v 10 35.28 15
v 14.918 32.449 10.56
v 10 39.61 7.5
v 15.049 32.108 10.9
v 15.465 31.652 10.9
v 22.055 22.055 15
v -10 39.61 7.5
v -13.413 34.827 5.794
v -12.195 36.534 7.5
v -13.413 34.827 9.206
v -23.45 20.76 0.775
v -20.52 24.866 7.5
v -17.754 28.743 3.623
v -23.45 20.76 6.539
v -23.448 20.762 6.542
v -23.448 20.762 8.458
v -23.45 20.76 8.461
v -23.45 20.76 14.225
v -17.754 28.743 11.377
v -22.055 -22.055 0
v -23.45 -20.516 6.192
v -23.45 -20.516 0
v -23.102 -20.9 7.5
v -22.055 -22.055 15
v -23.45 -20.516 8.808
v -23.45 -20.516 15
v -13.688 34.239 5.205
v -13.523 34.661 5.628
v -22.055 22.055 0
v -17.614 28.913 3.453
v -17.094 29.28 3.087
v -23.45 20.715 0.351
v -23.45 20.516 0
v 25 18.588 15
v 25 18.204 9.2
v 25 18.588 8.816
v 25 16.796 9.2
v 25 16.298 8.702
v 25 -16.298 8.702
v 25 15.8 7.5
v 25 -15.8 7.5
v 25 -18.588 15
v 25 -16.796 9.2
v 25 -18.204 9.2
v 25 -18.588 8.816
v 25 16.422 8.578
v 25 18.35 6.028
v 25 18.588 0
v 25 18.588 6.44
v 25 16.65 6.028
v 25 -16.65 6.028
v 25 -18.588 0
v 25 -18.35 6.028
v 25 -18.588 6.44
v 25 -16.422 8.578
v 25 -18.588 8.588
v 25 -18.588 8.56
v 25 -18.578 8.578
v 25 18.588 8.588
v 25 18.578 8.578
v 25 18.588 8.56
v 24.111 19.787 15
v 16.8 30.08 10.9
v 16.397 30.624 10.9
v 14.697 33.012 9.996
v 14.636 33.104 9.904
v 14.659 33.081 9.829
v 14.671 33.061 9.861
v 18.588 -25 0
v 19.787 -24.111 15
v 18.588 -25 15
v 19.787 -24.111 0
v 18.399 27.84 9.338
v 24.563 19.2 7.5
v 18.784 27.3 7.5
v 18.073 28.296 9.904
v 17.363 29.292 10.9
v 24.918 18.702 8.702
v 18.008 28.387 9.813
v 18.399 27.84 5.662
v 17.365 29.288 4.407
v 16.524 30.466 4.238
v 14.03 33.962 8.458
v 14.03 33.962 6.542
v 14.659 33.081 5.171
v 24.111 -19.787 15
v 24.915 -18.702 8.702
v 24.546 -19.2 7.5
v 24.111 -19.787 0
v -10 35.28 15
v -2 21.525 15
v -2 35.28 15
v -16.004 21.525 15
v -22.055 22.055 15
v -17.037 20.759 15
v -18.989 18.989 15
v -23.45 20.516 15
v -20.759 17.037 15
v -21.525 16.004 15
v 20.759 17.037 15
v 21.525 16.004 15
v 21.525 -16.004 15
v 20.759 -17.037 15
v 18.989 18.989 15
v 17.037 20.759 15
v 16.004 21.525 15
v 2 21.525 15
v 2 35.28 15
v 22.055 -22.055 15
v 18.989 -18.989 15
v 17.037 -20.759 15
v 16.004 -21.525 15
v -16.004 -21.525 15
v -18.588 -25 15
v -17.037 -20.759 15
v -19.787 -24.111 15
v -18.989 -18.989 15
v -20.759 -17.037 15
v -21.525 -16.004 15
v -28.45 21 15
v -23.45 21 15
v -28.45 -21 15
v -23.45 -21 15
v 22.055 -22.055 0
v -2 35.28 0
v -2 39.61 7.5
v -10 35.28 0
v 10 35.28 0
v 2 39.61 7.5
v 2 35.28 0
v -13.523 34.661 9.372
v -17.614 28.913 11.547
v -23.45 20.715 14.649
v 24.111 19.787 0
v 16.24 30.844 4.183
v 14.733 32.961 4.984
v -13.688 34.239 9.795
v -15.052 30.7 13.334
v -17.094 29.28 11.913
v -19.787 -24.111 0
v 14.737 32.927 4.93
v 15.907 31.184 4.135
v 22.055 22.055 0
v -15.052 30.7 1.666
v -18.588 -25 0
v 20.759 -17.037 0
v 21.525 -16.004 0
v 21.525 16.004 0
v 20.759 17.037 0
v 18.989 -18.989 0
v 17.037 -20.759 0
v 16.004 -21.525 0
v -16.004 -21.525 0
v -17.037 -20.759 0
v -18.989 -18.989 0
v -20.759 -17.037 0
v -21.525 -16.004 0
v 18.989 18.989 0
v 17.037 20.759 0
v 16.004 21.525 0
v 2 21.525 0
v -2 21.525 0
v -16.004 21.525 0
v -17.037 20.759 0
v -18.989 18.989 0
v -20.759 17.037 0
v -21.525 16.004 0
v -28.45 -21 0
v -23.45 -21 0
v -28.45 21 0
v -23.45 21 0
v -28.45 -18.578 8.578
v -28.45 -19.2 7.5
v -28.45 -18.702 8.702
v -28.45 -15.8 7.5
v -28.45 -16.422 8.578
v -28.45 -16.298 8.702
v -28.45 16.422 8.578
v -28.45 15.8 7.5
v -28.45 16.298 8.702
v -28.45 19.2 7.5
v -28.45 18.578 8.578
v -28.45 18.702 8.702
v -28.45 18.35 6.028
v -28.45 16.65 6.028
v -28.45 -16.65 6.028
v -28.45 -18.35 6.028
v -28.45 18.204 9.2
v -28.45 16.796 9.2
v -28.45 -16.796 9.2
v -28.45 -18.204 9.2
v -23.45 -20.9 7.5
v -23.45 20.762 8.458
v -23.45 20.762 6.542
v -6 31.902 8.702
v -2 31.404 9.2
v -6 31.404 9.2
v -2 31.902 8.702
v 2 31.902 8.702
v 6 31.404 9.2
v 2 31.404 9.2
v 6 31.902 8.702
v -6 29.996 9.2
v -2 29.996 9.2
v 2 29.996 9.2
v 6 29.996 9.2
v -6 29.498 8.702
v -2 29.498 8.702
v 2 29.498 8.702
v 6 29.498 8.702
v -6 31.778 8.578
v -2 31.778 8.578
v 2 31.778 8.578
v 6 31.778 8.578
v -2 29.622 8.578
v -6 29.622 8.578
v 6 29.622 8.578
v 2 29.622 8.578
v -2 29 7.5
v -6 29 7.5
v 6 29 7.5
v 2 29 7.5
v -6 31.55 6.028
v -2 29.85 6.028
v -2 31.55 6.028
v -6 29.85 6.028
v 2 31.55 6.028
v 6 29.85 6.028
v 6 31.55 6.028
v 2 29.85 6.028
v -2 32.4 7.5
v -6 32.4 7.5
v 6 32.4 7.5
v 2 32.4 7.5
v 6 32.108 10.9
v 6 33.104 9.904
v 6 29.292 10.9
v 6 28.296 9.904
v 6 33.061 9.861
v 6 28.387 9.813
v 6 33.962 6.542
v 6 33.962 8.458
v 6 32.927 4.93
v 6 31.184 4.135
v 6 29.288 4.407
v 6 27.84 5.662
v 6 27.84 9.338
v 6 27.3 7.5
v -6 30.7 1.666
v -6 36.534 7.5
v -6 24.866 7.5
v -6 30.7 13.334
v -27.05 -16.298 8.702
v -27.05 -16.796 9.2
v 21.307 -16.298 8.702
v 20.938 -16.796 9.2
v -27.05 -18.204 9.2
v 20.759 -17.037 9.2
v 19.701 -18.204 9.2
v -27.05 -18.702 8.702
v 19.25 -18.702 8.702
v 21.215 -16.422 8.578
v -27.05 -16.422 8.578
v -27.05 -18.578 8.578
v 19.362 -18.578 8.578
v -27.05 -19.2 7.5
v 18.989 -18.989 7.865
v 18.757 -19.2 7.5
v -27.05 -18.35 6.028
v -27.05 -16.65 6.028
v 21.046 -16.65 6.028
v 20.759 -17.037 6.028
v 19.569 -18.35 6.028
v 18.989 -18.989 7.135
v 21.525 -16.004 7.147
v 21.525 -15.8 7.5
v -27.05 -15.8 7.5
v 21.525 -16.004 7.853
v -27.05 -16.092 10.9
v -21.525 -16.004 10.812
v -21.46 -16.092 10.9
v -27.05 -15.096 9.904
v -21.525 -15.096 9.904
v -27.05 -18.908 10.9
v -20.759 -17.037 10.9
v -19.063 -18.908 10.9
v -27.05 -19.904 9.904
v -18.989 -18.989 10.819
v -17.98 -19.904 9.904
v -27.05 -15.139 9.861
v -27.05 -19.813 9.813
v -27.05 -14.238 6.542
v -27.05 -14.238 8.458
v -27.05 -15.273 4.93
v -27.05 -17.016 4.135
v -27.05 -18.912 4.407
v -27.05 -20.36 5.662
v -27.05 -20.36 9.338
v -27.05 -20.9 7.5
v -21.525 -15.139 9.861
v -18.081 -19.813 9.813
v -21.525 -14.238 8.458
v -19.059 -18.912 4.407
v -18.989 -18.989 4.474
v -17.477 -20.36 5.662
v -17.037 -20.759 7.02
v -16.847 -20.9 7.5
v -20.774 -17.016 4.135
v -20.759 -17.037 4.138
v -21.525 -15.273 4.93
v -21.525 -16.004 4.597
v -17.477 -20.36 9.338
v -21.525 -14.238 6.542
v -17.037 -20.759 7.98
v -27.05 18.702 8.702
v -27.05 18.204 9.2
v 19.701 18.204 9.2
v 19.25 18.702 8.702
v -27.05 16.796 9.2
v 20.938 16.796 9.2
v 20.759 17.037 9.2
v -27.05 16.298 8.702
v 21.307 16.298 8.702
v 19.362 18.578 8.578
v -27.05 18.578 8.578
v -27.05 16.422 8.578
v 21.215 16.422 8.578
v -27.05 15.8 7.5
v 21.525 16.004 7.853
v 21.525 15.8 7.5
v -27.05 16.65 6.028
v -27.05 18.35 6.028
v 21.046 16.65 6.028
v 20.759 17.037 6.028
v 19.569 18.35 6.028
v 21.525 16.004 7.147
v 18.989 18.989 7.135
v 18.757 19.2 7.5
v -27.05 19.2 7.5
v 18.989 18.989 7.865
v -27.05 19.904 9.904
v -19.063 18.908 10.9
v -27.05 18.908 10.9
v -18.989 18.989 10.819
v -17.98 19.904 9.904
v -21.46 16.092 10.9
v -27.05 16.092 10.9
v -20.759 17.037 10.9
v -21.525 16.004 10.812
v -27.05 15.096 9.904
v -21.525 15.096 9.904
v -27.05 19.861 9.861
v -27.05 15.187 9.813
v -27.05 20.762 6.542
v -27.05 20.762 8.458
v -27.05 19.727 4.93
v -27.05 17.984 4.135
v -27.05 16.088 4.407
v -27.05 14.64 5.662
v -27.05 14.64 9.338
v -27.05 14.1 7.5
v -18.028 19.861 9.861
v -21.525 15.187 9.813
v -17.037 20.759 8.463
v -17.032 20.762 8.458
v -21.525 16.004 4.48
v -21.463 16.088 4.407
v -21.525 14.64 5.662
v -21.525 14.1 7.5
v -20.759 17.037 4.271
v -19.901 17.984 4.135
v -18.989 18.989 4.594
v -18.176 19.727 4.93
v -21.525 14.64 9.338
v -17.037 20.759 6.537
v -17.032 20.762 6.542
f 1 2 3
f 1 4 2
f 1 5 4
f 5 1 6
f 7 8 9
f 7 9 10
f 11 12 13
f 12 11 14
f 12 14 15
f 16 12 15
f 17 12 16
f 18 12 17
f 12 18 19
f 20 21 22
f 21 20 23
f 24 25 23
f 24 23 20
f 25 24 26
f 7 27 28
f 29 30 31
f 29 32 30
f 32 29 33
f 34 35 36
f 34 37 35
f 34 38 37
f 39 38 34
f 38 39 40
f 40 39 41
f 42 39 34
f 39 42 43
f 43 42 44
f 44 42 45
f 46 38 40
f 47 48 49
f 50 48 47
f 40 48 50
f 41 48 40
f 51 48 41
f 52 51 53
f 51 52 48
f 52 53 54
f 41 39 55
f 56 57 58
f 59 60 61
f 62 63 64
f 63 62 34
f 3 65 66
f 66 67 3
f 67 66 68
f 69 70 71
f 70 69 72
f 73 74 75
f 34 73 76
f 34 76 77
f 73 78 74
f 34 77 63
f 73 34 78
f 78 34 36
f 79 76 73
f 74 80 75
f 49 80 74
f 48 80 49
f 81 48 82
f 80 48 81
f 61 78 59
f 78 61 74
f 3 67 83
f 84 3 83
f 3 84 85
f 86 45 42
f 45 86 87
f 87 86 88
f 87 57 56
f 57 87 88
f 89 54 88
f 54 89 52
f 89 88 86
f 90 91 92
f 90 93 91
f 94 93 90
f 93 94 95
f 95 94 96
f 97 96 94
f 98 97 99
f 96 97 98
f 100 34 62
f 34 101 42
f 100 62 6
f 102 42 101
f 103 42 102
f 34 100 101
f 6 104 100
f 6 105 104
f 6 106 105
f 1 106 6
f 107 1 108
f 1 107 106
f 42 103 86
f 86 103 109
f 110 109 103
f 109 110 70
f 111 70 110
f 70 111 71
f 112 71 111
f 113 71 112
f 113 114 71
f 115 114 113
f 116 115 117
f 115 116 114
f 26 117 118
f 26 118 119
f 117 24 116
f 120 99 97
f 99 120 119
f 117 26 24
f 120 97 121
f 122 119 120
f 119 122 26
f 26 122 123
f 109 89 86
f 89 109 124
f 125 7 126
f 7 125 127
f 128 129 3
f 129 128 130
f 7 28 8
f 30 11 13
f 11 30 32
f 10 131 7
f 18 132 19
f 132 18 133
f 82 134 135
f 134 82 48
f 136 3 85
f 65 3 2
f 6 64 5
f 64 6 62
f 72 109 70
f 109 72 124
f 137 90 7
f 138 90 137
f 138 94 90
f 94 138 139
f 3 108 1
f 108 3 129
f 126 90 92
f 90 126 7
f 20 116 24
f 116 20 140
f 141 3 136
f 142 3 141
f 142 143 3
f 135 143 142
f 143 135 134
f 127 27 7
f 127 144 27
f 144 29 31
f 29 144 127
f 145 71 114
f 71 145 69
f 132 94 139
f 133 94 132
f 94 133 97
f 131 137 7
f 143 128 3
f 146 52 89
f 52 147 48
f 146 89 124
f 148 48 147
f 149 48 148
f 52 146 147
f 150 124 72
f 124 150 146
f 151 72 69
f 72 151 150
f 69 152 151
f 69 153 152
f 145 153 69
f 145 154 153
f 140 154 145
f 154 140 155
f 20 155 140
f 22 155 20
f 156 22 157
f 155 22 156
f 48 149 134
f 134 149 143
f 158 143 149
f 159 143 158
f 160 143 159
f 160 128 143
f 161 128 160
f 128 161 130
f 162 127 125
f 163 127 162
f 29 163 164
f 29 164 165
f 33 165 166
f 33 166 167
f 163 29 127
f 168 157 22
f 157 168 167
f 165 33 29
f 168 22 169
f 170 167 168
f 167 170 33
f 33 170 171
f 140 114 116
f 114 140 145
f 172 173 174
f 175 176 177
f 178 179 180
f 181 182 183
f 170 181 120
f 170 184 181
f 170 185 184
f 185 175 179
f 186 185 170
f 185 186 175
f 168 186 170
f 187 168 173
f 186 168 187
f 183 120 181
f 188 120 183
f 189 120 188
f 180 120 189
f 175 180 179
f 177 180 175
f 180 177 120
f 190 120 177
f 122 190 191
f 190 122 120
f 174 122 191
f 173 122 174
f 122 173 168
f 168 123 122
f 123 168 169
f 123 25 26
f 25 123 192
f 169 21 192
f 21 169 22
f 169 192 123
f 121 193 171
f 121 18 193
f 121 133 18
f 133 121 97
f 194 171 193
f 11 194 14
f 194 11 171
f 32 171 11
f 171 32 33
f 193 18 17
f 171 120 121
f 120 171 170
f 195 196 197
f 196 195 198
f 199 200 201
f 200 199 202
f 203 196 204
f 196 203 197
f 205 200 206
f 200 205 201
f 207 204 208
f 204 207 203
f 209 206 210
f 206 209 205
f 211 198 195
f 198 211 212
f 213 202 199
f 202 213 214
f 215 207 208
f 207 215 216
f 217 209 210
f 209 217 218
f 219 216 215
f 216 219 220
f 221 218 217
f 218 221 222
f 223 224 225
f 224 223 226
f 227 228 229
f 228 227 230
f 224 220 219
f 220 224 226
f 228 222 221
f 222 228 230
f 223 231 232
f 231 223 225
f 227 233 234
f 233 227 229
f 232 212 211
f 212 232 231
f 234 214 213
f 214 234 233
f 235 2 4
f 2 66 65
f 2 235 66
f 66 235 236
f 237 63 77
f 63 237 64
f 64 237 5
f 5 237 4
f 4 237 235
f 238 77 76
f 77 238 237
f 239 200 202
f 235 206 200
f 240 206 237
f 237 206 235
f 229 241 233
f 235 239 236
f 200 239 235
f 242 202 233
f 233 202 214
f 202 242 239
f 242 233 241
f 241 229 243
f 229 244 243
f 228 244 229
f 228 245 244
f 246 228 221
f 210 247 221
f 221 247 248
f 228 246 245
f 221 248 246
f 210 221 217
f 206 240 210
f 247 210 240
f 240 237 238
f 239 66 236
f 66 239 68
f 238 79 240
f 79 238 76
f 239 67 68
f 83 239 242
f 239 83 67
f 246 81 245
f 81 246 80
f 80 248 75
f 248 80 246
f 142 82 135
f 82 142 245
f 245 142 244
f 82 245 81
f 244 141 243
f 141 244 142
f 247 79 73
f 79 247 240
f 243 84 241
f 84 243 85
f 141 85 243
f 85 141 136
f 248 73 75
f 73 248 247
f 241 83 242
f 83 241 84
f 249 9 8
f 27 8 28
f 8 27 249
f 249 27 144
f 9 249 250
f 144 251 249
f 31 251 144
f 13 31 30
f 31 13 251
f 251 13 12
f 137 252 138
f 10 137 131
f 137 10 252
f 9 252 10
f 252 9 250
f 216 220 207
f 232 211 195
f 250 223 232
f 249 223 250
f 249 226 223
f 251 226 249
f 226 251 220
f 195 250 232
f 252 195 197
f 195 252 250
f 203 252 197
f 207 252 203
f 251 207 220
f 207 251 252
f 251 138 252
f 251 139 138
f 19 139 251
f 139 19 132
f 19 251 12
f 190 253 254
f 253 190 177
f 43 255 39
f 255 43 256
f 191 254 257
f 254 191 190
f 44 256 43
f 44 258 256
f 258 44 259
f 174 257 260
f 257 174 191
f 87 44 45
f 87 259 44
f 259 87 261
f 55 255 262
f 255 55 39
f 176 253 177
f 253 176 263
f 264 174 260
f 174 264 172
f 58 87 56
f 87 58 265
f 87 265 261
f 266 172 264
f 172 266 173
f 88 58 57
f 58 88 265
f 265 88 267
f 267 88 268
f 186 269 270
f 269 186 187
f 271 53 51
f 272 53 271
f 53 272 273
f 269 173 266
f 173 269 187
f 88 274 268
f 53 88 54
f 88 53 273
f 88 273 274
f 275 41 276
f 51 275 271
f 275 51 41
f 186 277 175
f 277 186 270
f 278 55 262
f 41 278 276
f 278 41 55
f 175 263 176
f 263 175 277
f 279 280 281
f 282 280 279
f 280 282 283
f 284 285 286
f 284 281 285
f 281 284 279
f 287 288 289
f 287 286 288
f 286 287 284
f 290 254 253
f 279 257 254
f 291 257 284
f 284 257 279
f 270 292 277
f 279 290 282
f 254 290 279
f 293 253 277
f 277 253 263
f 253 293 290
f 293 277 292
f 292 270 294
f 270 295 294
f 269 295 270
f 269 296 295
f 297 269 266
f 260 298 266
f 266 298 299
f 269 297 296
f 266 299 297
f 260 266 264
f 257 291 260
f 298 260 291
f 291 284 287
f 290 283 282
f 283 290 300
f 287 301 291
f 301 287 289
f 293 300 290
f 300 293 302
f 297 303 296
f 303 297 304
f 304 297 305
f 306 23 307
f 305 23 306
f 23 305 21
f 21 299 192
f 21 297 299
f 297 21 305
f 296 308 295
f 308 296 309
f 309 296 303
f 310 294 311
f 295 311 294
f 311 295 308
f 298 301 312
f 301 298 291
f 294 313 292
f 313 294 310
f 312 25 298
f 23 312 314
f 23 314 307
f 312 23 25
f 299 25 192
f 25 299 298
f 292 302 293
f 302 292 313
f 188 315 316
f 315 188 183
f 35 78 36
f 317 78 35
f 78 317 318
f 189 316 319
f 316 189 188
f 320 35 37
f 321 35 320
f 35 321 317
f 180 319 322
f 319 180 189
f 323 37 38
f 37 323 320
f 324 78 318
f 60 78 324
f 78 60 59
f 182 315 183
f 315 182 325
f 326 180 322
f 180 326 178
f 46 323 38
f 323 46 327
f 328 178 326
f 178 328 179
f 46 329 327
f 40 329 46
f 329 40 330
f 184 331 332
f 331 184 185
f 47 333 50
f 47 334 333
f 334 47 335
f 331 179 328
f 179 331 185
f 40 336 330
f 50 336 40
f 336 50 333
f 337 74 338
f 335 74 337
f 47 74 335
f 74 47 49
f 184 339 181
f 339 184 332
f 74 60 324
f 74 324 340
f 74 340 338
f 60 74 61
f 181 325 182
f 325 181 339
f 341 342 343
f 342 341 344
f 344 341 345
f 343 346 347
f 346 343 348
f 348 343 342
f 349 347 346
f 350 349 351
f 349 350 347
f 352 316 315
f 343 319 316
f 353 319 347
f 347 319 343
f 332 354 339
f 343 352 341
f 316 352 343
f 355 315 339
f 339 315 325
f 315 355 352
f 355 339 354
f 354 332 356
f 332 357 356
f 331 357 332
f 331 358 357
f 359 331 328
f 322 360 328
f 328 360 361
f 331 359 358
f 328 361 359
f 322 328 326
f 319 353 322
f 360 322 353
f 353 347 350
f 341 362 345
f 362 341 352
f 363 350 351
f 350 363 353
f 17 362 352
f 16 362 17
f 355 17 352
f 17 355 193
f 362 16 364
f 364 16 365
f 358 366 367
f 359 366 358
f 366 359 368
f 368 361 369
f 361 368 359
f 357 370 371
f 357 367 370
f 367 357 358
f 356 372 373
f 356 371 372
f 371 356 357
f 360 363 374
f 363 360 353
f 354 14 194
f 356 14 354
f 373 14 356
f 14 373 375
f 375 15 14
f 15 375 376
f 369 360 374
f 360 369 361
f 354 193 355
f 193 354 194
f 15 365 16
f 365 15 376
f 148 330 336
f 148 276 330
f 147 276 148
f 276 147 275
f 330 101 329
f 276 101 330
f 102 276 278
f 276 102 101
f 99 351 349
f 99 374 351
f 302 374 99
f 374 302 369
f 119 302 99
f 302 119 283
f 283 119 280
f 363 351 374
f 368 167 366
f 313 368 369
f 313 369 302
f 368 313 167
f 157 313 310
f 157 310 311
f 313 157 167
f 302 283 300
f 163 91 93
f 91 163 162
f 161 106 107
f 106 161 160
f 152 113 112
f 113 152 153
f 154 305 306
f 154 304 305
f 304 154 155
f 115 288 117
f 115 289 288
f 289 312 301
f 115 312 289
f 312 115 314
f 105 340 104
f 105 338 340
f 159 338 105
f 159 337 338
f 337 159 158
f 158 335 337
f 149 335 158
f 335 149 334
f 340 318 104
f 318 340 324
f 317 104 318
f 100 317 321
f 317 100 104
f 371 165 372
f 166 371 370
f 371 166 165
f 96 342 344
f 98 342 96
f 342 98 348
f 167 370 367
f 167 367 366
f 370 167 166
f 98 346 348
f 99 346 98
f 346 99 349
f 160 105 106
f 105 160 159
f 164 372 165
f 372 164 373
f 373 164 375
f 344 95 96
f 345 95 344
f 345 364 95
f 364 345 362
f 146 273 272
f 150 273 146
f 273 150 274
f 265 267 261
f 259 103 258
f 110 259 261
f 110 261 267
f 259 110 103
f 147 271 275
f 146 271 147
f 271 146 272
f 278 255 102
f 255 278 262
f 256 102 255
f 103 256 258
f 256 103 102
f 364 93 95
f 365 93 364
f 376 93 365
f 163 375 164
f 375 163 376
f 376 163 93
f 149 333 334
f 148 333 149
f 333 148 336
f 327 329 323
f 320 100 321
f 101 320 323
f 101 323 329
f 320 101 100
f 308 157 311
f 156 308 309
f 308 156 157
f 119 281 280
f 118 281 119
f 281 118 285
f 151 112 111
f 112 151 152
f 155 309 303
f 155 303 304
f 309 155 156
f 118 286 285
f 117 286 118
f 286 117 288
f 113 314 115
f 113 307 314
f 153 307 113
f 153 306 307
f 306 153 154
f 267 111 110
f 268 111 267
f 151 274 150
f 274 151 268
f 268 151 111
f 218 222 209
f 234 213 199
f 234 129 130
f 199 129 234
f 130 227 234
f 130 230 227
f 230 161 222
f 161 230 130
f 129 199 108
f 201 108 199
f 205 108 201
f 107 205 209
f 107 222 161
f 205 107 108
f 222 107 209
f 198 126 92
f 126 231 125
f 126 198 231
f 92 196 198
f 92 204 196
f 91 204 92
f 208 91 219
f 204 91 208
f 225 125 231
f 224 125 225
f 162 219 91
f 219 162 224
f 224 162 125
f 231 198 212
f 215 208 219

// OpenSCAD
slop=.2;

//english sizes - 6-32 - for graber i3 clamp
632_dia = 3.5;
632_rad = 632_dia/2+slop;
bolt_rad = 632_rad;
632_nut_rad = 8.25/cos(45)/2;
nut_rad = 632_nut_rad;
632_cap_dia = 6.5;
632_cap_rad = 632_cap_dia/2+slop;
632_cap_height = 2+slop;
632_nut_height = 5;


m3_nut_rad = 6.01/2+slop;
m3_nut_height = 2.4;
m3_rad = 3/2+slop;
m3_cap_rad = 3.25;


wall=4;
motor_w = 42;
motor_r = 52/2;

mount_sep = 35;  //needs to match ext_offset from x-carriage.scad


extruder_mount(mount_screw_rad=m3_rad);

//attaches the motor with one or two screws.
module extruder_mount(screws = 1, flip=0, fan_mount=0, mount_screw_rad = 632_rad, angle=0, height=15, offset=0, motor_offset=1){
	echo(height);
	wall=4;
	lower_hole_sep = 47.5;
	lower_hole_rad = 6+slop;
	lower_hole_height = -7.5;
	lower_hole_depth = 6;

	hole_sep=30;
	fan_hole_sep = 32;
	fan_offset= 5;
	
	scale_slop = 1.025;
	scale_size = (motor_w+wall+wall)/motor_w;
	difference(){
		union(){
			hull(){
				//strap
				scale([scale_size,scale_size,1]) motor_base(h=height);

				//clamp
				translate([0,motor_w/2+wall+632_rad+wall,height/2]) rotate([0,90,0]) clamp(height=height, 1);			
			}

			//mount base
			hull(){
				//translate([-motor_w/2+.05,0,height/2]) cube([.1,motor_w,height], center=true);
				translate([-motor_w/2-wall-wall/2+.05+1+offset,0,height/2]) rotate([0,0,angle]) cube([wall+1,motor_w,height], center=true);

				if(screws == 2){
					translate([-motor_w/2-wall-wall,0,height/2+hole_sep]) rotate([0,0,angle]) rotate([0,90,0]) cylinder(r=632_cap_rad+wall-.75, h=wall+1);
				}
			}

			//strengthen the vertical mount
			if(screws == 2){
				difference(){
					hull(){
						translate([-motor_w/2-wall/2+.05+1,0,height/2]) cube([wall+2,motor_w,height], center=true);

						translate([-motor_w/2-wall,0,height/2+hole_sep]) rotate([0,90,0]) cylinder(r=632_cap_rad+wall-.75, h=wall+2);
					}

					hull(){
						translate([-motor_w/2-wall+1+wall,0,height+wall]) rotate([90,0,0]) scale([1,1,1]) cylinder(r=wall, h=motor_w+wall*2, center=true, $fn=90);
                                                translate([-motor_w/2-wall+10+wall,0,height+wall]) rotate([90,0,0]) scale([1,1,1]) cylinder(r=wall, h=motor_w+wall*2, center=true, $fn=90);
						translate([-motor_w/2-wall+1+wall,0,height+wall*2+hole_sep]) rotate([90,0,0]) cylinder(r=wall, h=motor_w+wall, center=true);
					}
				}
			}

			//add a fan mount
			if(fan_mount==1){
				for(i=[-1,1]) translate([fan_hole_sep/2*i, -motor_w/2-wall, 0]) hull(){
					cylinder(r=wall+m3_rad, h=wall*2);
					translate([0, -fan_offset, 0]) cylinder(r=wall+m3_rad, h=wall*2);
				}
			}
		}

		//slit
		translate([0,motor_w/2,height/2]) cube([wall,motor_w,height+1],center=true);

		//clamp holes
		render() translate([0,motor_w/2+wall+mount_screw_rad+wall,height/2]) rotate([0,90,0]) clamp(height=height, 0, mount_screw_rad, 0);
		
		//mounting holes
        for(i=[-mount_sep/2, mount_sep/2])
            #translate([-motor_w/2-wall*2-.05,i,height/2]) rotate([0,0,angle]) {
                rotate([0,90,0]) rotate([0,0,-90]) translate([0,0,offset*2]) cap_cylinder(r=mount_screw_rad, h=200, center=true);
		
                translate([wall/2,0,0]) rotate([0,90,0]) rotate([0,0,-90]) cap_cylinder(r=mount_screw_rad*2, h=wall*3);
            }
	

		if(screws == 2) {
			translate([-motor_w/2-wall*2-.05,0,height/2+hole_sep]) rotate([0,0,angle]) {
                            rotate([0,90,0]) rotate([0,0,-90]) translate([0,0,offset*2]) cap_cylinder(r=mount_screw_rad, h=200, center=true);
		
                            translate([wall/2,0,0]) rotate([0,90,0]) rotate([0,0,-90]) cap_cylinder(r=mount_screw_rad*2, h=wall*3);
		}
		
			//make the screwholes, and avoid the other screws
			translate([-motor_w/2-wall-wall,0,height/2+hole_sep/2])
			for(i=[-1,1]) rotate([0,90,0]) rotate([0,0,-90]) {
				mirror([flip,0,0]) translate([lower_hole_height, lower_hole_sep/2*i, -.25]) cap_cylinder(r=lower_hole_rad, h=lower_hole_depth+.5, point=1);
			}
		}

		if(fan_mount==1){
			for(i=[-1,1]) translate([fan_hole_sep/2*i, -motor_w/2-wall-fan_offset, -.1]) {
				translate([0,0,wall]) cylinder(r1=m3_nut_rad+.1, r2=m3_nut_rad+.4, h=wall*2, $fn=6);
				cylinder(r=m3_rad, h=wall*3);
			}
		}

		//motor hole
		scale([scale_slop,scale_slop,1]) translate([0,0,-.05]) motor_base(h=height+wall);
	}
}

module clamp(solid = 1, mount_screw_rad = 632_rad, m5=0){
	len = wall*5;
	facets = 6;
	if(solid==1){
		rotate([0,0,180/facets]) cylinder(r=height/2/cos(180/facets), h=len, center=true, $fn=facets);	
	}else{
		//screwhole
		rotate([0,0,-90]) cap_cylinder(r=mount_screw_rad, h=len*2, center=true); 

		//nut is on the inside
		if(m5 == 1){
			mirror([0,0,1]) translate([0,0,wall*1.5]) rotate([0,0,-90]) cylinder(r1=m5_nut_rad, r2=m5_nut_rad+1, h=len, $fn=6);
		}else{
			mirror([0,0,1]) translate([0,0,wall*1.5]) rotate([0,0,-90]) cylinder(r=632_nut_rad, h=len, $fn=4);
		}
		

		//screw is on the outside
		translate([0,0,wall*1.5]) rotate([0,0,-90]) cap_cylinder(r=mount_screw_rad*2, h=len);
	}
}

module cap_cylinder(r=1, h=1, center=false, point = 0){
	render() union() {
		cylinder(r=r, h=h, center=center);
		if(point==0){
			intersection(){
				rotate([0,0,22.5]) cylinder(r=r/cos(180/8), h=h, $fn=8, center=center);
				translate([0,-r/cos(180/4),0]) rotate([0,0,0]) cylinder(r=r/cos(180/4), h=h, $fn=4, center=center);
			}
		}else{
			intersection(){
				rotate([0,0,0]) cylinder(r=r/cos(180/4), h=h, $fn=4, center=center);
				translate([0,-r/cos(180/4),0]) rotate([0,0,0]) cylinder(r=r/cos(180/4), h=h, $fn=4, center=center);
			}
		}
	}
}

//base plate
module base(solid=1, h=wall){
	if(solid==1){
		intersection(){
			motor_base(h);
			translate([0,0,h]) cube([motor_w,motor_w,h*2], center=true);
		}
        //pegs for the screws
        for(i=[0,90,180]){
            rotate([0,0,i]){
                translate([31/2+slop,31/2+slop,0]) cylinder(r=m3_cap_rad-.1, h=h*2, $fn=18);
                translate([31/2-slop,31/2-slop,0]) cylinder(r=m3_cap_rad-.1, h=h*2, $fn=18);
		    }
		}
	}else{
		motor_mount(h);
	}
}

//motor cutout and mount
module motor_mount(h=wall, h2=6.5){
	ridge_r = 12;
	ridge_h1 = 2.5;
	ridge_h2 = 8-ridge_h1; //2.3

	hull(){
		for(i=[0,wall/2]) {
			#translate([i,0,-.05]) cylinder(r=ridge_r, h=ridge_h1+.1, $fn=36);
		}
		translate([0,0,ridge_h1-.05]) cylinder(r1=ridge_r, r2=gear_rad, h=ridge_h2+.1, $fn=36);
	}

	for(i=[0,90,180]){
		rotate([0,0,i]){
			hull(){
				translate([31/2+slop,31/2+slop,0]) cylinder(r=m3_rad, h=20, $fn=18, center=true);
				translate([31/2-slop,31/2-slop,0]) cylinder(r=m3_rad, h=20, $fn=18, center=true);
			}
			translate([0,0,h2]) hull(){
				translate([31/2+slop,31/2+slop,0]) cylinder(r=m3_cap_rad, h=height*2, $fn=18);
				translate([31/2-slop,31/2-slop,0]) cylinder(r=m3_cap_rad, h=height, $fn=18);
			}
		}
	}
}

module motor_base(h=wall){
	intersection(){
		translate([0,0,h/2]) cube([motor_w, motor_w, h], center=true);
		cylinder(r=motor_r+slop, h=h, $fn=64);
	}
}
